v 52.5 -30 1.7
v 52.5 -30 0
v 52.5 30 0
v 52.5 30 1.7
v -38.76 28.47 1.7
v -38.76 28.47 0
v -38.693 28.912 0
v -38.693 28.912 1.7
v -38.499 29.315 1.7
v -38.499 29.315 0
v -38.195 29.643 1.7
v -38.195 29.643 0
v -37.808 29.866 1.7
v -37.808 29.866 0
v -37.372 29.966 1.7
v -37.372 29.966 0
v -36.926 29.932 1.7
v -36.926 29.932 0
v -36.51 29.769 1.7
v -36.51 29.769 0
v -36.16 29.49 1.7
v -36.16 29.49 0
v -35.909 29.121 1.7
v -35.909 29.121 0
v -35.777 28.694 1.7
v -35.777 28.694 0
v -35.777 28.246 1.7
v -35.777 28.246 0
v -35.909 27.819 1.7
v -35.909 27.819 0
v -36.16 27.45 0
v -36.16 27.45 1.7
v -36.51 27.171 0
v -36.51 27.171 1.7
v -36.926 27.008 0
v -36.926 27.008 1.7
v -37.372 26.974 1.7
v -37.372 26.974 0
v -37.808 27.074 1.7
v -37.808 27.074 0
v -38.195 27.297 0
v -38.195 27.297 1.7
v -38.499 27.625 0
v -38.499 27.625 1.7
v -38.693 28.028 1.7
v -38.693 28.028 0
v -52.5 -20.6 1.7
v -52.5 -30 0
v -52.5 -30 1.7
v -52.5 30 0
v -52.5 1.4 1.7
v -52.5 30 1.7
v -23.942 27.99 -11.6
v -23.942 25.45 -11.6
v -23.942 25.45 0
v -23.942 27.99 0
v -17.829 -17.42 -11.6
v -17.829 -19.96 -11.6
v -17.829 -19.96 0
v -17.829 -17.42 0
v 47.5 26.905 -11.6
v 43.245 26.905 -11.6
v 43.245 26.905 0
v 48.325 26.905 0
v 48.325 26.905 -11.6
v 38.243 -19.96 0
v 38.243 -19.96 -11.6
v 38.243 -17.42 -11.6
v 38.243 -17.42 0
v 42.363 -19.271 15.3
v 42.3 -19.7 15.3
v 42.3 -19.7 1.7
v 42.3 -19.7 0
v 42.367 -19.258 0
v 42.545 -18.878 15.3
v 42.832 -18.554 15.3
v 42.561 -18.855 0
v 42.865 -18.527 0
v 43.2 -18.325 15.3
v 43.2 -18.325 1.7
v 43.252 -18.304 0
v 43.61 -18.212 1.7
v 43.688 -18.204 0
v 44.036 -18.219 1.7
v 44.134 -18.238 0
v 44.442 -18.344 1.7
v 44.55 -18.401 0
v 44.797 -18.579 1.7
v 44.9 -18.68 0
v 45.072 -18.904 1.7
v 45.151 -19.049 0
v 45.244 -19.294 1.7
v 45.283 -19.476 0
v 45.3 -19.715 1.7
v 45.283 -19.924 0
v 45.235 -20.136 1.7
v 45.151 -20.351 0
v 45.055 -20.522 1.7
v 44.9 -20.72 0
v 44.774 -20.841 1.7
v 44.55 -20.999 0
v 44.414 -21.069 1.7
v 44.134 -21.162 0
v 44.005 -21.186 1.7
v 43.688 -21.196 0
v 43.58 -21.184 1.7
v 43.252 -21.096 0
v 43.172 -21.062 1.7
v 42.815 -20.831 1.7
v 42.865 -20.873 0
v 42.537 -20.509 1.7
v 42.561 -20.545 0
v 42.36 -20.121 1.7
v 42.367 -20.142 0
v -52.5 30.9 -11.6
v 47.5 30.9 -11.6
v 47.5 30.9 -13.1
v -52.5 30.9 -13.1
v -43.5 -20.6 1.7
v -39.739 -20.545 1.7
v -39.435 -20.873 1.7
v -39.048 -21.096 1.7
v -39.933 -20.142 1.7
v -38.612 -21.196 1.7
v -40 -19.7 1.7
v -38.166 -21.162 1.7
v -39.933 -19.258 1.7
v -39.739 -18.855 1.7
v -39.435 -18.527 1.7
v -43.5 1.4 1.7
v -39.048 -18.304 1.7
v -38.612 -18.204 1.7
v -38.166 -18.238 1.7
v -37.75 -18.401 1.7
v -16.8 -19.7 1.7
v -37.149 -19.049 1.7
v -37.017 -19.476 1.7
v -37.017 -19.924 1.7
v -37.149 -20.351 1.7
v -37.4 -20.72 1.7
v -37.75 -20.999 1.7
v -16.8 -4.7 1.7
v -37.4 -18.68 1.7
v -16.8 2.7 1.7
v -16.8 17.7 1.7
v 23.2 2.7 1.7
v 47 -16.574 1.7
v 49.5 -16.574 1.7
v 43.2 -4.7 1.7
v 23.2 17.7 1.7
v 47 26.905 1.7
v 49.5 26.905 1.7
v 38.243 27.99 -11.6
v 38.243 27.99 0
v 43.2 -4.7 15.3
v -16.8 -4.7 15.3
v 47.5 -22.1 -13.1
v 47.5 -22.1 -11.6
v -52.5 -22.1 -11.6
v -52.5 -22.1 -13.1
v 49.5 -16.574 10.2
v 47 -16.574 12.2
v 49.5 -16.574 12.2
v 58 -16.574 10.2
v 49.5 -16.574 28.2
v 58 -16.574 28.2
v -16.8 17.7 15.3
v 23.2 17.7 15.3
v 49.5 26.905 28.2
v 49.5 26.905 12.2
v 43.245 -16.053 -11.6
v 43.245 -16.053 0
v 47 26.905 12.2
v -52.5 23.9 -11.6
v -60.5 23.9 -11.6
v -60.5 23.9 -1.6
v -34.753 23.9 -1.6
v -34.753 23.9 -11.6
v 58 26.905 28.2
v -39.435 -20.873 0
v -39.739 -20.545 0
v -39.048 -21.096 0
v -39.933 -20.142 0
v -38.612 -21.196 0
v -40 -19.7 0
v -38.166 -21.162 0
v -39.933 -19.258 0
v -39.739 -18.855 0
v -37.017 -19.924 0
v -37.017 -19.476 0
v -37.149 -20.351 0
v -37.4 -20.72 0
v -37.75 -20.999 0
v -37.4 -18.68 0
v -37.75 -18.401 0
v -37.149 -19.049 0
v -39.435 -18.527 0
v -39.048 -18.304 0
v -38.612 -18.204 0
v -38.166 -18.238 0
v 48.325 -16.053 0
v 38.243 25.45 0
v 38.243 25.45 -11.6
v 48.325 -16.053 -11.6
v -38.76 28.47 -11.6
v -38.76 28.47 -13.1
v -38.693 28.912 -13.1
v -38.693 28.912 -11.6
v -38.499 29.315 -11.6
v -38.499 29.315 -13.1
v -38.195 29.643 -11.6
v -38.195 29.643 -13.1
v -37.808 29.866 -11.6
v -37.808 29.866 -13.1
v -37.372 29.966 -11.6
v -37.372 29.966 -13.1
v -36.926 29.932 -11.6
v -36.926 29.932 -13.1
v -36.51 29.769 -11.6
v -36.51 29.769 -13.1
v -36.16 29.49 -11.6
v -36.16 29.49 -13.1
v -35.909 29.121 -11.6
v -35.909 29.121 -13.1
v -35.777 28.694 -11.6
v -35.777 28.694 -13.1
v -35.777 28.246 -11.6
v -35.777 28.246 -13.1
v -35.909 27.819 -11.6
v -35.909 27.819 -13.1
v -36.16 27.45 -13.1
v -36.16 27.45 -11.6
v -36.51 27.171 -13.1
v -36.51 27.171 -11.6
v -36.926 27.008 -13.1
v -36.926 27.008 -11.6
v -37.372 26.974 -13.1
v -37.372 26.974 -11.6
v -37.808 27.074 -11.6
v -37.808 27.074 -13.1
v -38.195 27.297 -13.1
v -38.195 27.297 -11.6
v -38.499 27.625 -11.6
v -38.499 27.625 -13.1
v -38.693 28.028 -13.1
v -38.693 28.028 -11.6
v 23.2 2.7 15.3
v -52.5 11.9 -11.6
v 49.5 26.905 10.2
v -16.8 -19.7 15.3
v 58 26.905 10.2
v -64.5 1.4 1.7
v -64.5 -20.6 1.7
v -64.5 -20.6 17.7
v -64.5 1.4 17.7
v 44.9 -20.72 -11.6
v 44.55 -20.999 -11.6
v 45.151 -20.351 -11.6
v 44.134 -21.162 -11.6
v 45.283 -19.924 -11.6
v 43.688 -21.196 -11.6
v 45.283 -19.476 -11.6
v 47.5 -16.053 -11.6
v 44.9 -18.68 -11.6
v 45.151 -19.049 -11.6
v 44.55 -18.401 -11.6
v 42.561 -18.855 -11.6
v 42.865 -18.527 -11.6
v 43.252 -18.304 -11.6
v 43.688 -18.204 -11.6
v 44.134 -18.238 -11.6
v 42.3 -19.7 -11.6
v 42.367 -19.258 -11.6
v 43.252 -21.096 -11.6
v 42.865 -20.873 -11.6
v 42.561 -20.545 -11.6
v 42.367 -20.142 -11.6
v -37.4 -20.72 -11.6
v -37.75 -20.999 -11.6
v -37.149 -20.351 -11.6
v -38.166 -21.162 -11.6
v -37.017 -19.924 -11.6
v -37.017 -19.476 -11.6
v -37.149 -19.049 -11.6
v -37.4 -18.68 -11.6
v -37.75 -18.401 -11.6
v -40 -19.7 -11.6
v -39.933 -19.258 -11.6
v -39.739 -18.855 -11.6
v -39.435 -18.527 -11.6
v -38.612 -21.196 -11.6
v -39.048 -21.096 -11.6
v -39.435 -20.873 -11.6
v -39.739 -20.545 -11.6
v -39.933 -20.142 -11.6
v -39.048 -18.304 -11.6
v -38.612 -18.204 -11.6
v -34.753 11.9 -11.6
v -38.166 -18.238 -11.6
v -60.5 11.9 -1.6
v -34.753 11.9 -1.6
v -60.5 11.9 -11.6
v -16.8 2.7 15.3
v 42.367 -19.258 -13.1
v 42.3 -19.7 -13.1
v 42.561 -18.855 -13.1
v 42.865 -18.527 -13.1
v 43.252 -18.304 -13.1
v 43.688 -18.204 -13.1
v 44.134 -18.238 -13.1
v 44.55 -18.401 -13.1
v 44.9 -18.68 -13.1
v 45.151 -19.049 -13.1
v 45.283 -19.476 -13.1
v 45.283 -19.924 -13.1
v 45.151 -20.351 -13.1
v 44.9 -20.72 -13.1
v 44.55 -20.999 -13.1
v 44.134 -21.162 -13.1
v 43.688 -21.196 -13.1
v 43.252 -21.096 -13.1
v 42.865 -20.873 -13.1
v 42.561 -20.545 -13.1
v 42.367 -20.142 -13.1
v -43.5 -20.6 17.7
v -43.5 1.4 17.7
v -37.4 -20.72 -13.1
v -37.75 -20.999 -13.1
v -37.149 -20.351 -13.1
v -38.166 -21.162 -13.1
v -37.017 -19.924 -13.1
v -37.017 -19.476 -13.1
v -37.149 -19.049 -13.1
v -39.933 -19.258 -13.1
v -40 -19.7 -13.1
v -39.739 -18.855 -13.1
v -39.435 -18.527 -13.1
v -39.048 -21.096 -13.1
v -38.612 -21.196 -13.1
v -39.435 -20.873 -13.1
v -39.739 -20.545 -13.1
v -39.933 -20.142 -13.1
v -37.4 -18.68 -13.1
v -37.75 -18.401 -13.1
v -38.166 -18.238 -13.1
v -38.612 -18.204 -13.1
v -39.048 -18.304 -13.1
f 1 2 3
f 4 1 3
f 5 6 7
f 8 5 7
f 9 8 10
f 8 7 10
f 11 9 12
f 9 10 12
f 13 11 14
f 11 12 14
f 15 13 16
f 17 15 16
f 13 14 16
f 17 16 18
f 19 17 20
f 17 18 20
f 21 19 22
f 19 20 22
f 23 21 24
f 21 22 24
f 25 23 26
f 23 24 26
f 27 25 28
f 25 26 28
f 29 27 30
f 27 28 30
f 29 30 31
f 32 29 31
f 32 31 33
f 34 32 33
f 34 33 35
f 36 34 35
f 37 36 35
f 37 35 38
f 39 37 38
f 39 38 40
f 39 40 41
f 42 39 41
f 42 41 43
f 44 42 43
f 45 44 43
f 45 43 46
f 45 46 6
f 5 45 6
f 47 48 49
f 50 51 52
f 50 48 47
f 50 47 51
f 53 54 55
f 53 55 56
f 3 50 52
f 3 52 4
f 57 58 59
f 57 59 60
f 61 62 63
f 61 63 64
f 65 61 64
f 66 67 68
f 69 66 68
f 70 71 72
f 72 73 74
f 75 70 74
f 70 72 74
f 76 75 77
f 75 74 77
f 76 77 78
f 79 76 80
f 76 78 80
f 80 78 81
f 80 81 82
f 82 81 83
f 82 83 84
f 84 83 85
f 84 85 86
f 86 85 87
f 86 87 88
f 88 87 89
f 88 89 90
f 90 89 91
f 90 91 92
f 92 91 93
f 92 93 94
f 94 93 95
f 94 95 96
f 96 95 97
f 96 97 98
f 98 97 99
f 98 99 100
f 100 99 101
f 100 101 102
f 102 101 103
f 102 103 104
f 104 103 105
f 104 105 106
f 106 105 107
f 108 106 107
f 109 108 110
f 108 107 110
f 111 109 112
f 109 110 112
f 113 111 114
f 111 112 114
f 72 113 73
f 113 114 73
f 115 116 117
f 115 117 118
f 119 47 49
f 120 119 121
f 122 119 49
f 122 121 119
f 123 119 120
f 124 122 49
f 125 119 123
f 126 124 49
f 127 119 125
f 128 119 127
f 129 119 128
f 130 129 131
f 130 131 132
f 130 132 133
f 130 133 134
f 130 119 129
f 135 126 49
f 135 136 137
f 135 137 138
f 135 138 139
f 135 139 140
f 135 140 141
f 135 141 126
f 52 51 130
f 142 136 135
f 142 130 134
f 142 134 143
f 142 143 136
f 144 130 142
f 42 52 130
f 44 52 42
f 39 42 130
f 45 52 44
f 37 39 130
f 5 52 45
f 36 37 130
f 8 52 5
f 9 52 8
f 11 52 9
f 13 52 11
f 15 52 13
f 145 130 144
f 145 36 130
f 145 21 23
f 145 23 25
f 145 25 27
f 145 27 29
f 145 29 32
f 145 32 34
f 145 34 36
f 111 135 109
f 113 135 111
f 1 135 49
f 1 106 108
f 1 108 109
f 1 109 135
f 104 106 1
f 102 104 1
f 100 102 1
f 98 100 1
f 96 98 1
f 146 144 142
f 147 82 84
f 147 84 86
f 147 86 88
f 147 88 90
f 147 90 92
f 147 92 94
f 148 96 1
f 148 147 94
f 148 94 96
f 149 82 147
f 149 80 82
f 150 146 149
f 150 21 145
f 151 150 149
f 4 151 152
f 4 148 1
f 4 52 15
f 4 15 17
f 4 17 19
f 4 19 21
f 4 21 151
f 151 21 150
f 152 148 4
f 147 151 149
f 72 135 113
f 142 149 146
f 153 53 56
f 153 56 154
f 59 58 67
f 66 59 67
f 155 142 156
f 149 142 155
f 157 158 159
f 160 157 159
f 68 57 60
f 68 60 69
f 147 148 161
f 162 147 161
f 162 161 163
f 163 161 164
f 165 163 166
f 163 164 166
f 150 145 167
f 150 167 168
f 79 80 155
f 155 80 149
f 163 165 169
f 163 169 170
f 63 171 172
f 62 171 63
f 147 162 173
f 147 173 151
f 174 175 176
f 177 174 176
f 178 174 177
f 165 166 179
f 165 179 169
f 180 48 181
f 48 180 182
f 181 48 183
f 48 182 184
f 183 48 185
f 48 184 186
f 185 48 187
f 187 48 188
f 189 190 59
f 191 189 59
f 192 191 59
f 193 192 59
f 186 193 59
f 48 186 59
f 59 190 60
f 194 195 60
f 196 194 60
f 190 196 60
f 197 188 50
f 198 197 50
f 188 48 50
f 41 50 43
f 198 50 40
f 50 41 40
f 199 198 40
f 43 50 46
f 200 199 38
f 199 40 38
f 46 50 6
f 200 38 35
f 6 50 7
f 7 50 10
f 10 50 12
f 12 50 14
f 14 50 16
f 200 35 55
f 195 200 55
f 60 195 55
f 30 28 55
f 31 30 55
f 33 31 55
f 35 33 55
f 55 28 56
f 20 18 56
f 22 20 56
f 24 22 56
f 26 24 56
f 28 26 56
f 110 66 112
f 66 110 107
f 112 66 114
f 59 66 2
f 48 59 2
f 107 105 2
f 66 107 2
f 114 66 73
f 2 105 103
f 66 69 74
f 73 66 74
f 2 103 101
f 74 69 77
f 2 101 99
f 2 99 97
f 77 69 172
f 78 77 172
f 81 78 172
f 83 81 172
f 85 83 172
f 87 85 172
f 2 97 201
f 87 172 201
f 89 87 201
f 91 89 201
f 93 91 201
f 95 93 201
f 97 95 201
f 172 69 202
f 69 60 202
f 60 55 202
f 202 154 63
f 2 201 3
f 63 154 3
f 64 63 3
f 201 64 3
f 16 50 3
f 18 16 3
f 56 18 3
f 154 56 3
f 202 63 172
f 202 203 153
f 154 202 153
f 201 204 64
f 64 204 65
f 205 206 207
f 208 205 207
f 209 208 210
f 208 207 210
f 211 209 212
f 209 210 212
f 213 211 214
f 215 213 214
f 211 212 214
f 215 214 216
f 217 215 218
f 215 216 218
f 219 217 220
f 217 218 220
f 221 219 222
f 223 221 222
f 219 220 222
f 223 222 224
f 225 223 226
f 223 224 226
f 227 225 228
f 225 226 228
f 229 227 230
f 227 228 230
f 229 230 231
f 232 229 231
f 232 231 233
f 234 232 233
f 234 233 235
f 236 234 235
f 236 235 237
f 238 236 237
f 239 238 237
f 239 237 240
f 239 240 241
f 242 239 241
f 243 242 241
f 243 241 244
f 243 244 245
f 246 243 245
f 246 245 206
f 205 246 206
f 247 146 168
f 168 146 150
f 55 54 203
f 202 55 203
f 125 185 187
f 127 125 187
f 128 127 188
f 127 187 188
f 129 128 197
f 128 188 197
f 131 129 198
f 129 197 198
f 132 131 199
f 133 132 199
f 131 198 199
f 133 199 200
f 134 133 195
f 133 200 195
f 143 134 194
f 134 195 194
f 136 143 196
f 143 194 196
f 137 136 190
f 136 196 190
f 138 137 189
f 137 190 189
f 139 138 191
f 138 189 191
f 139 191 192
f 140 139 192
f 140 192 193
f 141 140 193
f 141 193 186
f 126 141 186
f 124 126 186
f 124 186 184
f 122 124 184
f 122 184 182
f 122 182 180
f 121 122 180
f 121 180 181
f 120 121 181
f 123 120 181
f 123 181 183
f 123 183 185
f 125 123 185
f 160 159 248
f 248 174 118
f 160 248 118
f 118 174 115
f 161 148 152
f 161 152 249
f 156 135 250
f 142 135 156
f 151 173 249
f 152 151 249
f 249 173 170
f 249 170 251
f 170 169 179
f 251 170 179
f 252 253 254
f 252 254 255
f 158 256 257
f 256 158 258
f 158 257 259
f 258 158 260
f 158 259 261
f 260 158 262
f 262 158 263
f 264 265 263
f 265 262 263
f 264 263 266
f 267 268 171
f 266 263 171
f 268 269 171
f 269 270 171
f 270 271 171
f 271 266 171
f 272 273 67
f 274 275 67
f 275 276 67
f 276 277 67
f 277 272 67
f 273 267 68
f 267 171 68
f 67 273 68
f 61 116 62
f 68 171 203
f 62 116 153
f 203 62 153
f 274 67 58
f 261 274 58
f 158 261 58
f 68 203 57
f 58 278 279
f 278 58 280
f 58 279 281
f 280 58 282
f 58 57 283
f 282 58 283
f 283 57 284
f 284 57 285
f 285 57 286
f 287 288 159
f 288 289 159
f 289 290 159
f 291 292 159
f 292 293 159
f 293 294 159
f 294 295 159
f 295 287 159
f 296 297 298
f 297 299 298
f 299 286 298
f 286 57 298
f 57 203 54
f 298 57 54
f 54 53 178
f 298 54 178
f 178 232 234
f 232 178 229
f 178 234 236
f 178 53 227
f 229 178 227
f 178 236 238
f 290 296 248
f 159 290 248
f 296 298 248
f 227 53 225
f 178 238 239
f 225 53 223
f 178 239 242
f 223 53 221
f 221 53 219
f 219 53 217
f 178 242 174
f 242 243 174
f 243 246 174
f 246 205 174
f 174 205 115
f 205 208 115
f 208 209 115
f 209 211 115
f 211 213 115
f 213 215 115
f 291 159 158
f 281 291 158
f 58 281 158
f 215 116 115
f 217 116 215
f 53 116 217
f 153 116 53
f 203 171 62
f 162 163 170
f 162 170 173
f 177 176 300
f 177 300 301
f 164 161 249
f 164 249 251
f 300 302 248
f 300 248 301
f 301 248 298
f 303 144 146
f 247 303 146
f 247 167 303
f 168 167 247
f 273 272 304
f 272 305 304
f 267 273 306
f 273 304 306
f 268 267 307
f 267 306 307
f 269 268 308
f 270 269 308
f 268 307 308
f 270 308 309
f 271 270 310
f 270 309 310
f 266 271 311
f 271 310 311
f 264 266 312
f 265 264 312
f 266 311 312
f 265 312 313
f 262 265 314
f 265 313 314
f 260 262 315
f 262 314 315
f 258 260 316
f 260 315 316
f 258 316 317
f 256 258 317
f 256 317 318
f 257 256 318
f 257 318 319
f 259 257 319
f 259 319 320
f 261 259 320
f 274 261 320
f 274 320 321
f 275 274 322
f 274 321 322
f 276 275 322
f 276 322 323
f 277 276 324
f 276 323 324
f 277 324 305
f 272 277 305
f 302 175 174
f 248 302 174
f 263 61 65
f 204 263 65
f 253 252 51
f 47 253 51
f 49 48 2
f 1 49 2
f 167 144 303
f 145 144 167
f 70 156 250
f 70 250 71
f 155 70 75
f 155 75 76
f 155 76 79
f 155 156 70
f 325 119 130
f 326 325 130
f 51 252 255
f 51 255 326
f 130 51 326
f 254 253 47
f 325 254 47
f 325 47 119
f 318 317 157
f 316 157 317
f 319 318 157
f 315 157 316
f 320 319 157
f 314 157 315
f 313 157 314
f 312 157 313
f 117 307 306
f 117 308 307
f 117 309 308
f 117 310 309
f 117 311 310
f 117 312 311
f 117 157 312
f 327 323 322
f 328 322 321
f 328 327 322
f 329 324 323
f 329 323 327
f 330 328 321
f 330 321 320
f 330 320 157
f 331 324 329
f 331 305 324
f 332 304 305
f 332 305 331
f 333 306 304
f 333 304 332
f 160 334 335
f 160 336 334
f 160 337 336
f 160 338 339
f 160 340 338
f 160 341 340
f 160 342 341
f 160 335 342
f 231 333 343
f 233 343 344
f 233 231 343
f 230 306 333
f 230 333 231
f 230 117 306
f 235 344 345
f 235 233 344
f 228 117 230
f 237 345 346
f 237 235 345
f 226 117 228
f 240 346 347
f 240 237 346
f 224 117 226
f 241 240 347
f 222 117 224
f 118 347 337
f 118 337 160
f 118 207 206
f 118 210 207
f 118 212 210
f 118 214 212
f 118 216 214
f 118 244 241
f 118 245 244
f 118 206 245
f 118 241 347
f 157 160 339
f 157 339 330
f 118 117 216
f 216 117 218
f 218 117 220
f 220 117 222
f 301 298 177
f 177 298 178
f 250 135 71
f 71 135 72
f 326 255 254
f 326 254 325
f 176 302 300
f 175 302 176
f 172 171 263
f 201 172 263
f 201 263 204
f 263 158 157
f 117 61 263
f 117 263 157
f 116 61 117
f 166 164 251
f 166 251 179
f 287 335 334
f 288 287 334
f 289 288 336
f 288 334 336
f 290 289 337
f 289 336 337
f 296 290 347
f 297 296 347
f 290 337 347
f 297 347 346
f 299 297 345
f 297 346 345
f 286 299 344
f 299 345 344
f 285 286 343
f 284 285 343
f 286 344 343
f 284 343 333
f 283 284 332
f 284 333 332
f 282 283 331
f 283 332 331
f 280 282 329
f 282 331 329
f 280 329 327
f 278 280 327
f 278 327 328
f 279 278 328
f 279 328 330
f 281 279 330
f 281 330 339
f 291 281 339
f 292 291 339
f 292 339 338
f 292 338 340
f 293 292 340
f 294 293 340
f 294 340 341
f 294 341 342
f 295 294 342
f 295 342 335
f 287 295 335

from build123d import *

# Parameters (mm, degrees)
ESBO_O1_W                 = 105
ESBO_O1_H                 = 60
RESSALTO_EXTRUS_O1_DEPTH  = 1.7
ESBO_O2_W                 = 60
ESBO_O2_H                 = 15
ESBO_O2_W_2               = 40
RESSALTO_EXTRUS_O2_DEPTH  = 13.6
RESSALTO_EXTRUS_O6_START  = 11.6
ESBO_O3_W                 = 100
ESBO_O3_H                 = 53
RESSALTO_EXTRUS_O6_DEPTH  = 1.5
ESBO_O4_W                 = 62.184169383
ESBO_O4_H                 = 2.54
ESBO_O4_W_2               = 5.08
ESBO_O4_H_2               = 42.957805244
ESBO_O4_W_3               = 56.07185462
RESSALTO_EXTRUS_O8_DEPTH  = 11.6
ESBO_O6_W                 = 21
ESBO_O6_H                 = 22
RESSALTO_EXTRUS_O9_DEPTH  = 16
ESBO_O7_W                 = 25.746964405
ESBO_O7_H                 = 12
RESSALTO_EXTRUS_O10_DEPTH = 10
ESBO_O8_R                 = 1.5
CORTE_EXTRUS_O1_DEPTH     = 78.869763066
RESSALTO_EXTRUS_O11_DEPTH = 56.905179102
CORTE_EXTRUS_O2_REACH     = 131.446


with BuildPart() as part:
    # Esboço1 → Ressalto-extrusão1 (new body)
    with BuildSketch(Plane.XY):
        Rectangle(ESBO_O1_W, ESBO_O1_H)
    extrude(amount=RESSALTO_EXTRUS_O1_DEPTH)

    # Esboço2 → Ressalto-extrusão2 (add)
    with BuildSketch(Plane.XY.offset(1.7)):
        with Locations((13.2, -12.2)):
            Rectangle(ESBO_O2_W, ESBO_O2_H)
        with Locations((3.2, 10.2)):
            Rectangle(ESBO_O2_W_2, ESBO_O2_H)
    extrude(amount=RESSALTO_EXTRUS_O2_DEPTH)



with BuildPart() as body_2:
    # Esboço3 → Ressalto-extrusão6 (new body)
    with BuildSketch(Plane(origin=(0, 0, 0), x_dir=(-1, 0, 0), z_dir=(0, 0, -1)).offset(RESSALTO_EXTRUS_O6_START)):
        with Locations((2.5, 4.4)):
            Rectangle(ESBO_O3_W, ESBO_O3_H)
    extrude(amount=RESSALTO_EXTRUS_O6_DEPTH)


with BuildPart() as part_1:
    add(part.part)

    add(body_2.part)  # Ressalto-extrusão8 merges body 2
    # Esboço4 → Ressalto-extrusão8 (add)
    with BuildSketch(Plane.XY.offset(-11.6)):
        with Locations((7.150543675, 26.719832293)):
            Rectangle(ESBO_O4_W, ESBO_O4_H)
        with Locations((45.784919315, 5.42627648)):
            Rectangle(ESBO_O4_W_2, ESBO_O4_H_2)
        with Locations((10.206701056, -18.689881399)):
            Rectangle(ESBO_O4_W_3, ESBO_O4_H)
    extrude(amount=RESSALTO_EXTRUS_O8_DEPTH)

    # Esboço6 → Ressalto-extrusão9 (add)
    with BuildSketch(Plane.XY.offset(1.7)):
        with Locations((-54, -9.6)):
            Rectangle(ESBO_O6_W, ESBO_O6_H)
    extrude(amount=RESSALTO_EXTRUS_O9_DEPTH)

    # Esboço7 → Ressalto-extrusão10 (add)
    with BuildSketch(Plane.XY.offset(-11.6)):
        with Locations((-47.626517798, 17.9)):
            Rectangle(ESBO_O7_W, ESBO_O7_H)
    extrude(amount=RESSALTO_EXTRUS_O10_DEPTH)

    # Esboço8 → Corte-extrusão1 (cut, through all)
    with BuildSketch(Plane(origin=(0, 0, -13.1), x_dir=(-1, 0, 0), z_dir=(0, 0, -1))):
        with Locations((37.26, 28.47)):
            Circle(ESBO_O8_R)
        with Locations((38.5, -19.7)):
            Circle(ESBO_O8_R)
        with Locations((-43.8, -19.7)):
            Circle(ESBO_O8_R)
    extrude(amount=-CORTE_EXTRUS_O1_DEPTH, mode=Mode.SUBTRACT)

    # Esboço9 → Ressalto-extrusão11 (add)
    with BuildSketch(Plane.XZ.offset(30)):
        Polygon((49.5, 1.7), (49.5, 10.2), (58, 10.2), (58, 28.2), (49.5, 28.2), (49.5, 12.2), (47, 12.2), (47, 1.7), align=None)
    extrude(amount=-RESSALTO_EXTRUS_O11_DEPTH)

    # Corte-extrusão2: up to this face of the body (flat: up to its plane)
    corte_extrus_o2_end = Plane(part_1.part.faces().sort_by_distance((47, -1.547410449, 6.95))[0])
    # Esboço10 → Corte-extrusão2 (cut, up to the picked face)
    with BuildSketch(Plane(origin=(58, 0, 0), x_dir=(0, 0, -1), z_dir=(1, 0, 0)), mode=Mode.PRIVATE) as corte_extrus_o2_sk1:
        Polygon((-10.2, -16.57372352), (-28.2, -16.57372352), (-28.2, -30), (-1.7, -30), (-1.7, -16.57372352), align=None)
    corte_extrus_o2_tool1 = split(extrude(corte_extrus_o2_sk1.sketch, amount=-CORTE_EXTRUS_O2_REACH, mode=Mode.PRIVATE), bisect_by=corte_extrus_o2_end, keep=Keep.BOTH, mode=Mode.PRIVATE)
    add(corte_extrus_o2_tool1.solids().sort_by(Axis((58, -23.286862, 14.95), (-1, 0, 0)))[0], mode=Mode.SUBTRACT)


solid = part_1.part
